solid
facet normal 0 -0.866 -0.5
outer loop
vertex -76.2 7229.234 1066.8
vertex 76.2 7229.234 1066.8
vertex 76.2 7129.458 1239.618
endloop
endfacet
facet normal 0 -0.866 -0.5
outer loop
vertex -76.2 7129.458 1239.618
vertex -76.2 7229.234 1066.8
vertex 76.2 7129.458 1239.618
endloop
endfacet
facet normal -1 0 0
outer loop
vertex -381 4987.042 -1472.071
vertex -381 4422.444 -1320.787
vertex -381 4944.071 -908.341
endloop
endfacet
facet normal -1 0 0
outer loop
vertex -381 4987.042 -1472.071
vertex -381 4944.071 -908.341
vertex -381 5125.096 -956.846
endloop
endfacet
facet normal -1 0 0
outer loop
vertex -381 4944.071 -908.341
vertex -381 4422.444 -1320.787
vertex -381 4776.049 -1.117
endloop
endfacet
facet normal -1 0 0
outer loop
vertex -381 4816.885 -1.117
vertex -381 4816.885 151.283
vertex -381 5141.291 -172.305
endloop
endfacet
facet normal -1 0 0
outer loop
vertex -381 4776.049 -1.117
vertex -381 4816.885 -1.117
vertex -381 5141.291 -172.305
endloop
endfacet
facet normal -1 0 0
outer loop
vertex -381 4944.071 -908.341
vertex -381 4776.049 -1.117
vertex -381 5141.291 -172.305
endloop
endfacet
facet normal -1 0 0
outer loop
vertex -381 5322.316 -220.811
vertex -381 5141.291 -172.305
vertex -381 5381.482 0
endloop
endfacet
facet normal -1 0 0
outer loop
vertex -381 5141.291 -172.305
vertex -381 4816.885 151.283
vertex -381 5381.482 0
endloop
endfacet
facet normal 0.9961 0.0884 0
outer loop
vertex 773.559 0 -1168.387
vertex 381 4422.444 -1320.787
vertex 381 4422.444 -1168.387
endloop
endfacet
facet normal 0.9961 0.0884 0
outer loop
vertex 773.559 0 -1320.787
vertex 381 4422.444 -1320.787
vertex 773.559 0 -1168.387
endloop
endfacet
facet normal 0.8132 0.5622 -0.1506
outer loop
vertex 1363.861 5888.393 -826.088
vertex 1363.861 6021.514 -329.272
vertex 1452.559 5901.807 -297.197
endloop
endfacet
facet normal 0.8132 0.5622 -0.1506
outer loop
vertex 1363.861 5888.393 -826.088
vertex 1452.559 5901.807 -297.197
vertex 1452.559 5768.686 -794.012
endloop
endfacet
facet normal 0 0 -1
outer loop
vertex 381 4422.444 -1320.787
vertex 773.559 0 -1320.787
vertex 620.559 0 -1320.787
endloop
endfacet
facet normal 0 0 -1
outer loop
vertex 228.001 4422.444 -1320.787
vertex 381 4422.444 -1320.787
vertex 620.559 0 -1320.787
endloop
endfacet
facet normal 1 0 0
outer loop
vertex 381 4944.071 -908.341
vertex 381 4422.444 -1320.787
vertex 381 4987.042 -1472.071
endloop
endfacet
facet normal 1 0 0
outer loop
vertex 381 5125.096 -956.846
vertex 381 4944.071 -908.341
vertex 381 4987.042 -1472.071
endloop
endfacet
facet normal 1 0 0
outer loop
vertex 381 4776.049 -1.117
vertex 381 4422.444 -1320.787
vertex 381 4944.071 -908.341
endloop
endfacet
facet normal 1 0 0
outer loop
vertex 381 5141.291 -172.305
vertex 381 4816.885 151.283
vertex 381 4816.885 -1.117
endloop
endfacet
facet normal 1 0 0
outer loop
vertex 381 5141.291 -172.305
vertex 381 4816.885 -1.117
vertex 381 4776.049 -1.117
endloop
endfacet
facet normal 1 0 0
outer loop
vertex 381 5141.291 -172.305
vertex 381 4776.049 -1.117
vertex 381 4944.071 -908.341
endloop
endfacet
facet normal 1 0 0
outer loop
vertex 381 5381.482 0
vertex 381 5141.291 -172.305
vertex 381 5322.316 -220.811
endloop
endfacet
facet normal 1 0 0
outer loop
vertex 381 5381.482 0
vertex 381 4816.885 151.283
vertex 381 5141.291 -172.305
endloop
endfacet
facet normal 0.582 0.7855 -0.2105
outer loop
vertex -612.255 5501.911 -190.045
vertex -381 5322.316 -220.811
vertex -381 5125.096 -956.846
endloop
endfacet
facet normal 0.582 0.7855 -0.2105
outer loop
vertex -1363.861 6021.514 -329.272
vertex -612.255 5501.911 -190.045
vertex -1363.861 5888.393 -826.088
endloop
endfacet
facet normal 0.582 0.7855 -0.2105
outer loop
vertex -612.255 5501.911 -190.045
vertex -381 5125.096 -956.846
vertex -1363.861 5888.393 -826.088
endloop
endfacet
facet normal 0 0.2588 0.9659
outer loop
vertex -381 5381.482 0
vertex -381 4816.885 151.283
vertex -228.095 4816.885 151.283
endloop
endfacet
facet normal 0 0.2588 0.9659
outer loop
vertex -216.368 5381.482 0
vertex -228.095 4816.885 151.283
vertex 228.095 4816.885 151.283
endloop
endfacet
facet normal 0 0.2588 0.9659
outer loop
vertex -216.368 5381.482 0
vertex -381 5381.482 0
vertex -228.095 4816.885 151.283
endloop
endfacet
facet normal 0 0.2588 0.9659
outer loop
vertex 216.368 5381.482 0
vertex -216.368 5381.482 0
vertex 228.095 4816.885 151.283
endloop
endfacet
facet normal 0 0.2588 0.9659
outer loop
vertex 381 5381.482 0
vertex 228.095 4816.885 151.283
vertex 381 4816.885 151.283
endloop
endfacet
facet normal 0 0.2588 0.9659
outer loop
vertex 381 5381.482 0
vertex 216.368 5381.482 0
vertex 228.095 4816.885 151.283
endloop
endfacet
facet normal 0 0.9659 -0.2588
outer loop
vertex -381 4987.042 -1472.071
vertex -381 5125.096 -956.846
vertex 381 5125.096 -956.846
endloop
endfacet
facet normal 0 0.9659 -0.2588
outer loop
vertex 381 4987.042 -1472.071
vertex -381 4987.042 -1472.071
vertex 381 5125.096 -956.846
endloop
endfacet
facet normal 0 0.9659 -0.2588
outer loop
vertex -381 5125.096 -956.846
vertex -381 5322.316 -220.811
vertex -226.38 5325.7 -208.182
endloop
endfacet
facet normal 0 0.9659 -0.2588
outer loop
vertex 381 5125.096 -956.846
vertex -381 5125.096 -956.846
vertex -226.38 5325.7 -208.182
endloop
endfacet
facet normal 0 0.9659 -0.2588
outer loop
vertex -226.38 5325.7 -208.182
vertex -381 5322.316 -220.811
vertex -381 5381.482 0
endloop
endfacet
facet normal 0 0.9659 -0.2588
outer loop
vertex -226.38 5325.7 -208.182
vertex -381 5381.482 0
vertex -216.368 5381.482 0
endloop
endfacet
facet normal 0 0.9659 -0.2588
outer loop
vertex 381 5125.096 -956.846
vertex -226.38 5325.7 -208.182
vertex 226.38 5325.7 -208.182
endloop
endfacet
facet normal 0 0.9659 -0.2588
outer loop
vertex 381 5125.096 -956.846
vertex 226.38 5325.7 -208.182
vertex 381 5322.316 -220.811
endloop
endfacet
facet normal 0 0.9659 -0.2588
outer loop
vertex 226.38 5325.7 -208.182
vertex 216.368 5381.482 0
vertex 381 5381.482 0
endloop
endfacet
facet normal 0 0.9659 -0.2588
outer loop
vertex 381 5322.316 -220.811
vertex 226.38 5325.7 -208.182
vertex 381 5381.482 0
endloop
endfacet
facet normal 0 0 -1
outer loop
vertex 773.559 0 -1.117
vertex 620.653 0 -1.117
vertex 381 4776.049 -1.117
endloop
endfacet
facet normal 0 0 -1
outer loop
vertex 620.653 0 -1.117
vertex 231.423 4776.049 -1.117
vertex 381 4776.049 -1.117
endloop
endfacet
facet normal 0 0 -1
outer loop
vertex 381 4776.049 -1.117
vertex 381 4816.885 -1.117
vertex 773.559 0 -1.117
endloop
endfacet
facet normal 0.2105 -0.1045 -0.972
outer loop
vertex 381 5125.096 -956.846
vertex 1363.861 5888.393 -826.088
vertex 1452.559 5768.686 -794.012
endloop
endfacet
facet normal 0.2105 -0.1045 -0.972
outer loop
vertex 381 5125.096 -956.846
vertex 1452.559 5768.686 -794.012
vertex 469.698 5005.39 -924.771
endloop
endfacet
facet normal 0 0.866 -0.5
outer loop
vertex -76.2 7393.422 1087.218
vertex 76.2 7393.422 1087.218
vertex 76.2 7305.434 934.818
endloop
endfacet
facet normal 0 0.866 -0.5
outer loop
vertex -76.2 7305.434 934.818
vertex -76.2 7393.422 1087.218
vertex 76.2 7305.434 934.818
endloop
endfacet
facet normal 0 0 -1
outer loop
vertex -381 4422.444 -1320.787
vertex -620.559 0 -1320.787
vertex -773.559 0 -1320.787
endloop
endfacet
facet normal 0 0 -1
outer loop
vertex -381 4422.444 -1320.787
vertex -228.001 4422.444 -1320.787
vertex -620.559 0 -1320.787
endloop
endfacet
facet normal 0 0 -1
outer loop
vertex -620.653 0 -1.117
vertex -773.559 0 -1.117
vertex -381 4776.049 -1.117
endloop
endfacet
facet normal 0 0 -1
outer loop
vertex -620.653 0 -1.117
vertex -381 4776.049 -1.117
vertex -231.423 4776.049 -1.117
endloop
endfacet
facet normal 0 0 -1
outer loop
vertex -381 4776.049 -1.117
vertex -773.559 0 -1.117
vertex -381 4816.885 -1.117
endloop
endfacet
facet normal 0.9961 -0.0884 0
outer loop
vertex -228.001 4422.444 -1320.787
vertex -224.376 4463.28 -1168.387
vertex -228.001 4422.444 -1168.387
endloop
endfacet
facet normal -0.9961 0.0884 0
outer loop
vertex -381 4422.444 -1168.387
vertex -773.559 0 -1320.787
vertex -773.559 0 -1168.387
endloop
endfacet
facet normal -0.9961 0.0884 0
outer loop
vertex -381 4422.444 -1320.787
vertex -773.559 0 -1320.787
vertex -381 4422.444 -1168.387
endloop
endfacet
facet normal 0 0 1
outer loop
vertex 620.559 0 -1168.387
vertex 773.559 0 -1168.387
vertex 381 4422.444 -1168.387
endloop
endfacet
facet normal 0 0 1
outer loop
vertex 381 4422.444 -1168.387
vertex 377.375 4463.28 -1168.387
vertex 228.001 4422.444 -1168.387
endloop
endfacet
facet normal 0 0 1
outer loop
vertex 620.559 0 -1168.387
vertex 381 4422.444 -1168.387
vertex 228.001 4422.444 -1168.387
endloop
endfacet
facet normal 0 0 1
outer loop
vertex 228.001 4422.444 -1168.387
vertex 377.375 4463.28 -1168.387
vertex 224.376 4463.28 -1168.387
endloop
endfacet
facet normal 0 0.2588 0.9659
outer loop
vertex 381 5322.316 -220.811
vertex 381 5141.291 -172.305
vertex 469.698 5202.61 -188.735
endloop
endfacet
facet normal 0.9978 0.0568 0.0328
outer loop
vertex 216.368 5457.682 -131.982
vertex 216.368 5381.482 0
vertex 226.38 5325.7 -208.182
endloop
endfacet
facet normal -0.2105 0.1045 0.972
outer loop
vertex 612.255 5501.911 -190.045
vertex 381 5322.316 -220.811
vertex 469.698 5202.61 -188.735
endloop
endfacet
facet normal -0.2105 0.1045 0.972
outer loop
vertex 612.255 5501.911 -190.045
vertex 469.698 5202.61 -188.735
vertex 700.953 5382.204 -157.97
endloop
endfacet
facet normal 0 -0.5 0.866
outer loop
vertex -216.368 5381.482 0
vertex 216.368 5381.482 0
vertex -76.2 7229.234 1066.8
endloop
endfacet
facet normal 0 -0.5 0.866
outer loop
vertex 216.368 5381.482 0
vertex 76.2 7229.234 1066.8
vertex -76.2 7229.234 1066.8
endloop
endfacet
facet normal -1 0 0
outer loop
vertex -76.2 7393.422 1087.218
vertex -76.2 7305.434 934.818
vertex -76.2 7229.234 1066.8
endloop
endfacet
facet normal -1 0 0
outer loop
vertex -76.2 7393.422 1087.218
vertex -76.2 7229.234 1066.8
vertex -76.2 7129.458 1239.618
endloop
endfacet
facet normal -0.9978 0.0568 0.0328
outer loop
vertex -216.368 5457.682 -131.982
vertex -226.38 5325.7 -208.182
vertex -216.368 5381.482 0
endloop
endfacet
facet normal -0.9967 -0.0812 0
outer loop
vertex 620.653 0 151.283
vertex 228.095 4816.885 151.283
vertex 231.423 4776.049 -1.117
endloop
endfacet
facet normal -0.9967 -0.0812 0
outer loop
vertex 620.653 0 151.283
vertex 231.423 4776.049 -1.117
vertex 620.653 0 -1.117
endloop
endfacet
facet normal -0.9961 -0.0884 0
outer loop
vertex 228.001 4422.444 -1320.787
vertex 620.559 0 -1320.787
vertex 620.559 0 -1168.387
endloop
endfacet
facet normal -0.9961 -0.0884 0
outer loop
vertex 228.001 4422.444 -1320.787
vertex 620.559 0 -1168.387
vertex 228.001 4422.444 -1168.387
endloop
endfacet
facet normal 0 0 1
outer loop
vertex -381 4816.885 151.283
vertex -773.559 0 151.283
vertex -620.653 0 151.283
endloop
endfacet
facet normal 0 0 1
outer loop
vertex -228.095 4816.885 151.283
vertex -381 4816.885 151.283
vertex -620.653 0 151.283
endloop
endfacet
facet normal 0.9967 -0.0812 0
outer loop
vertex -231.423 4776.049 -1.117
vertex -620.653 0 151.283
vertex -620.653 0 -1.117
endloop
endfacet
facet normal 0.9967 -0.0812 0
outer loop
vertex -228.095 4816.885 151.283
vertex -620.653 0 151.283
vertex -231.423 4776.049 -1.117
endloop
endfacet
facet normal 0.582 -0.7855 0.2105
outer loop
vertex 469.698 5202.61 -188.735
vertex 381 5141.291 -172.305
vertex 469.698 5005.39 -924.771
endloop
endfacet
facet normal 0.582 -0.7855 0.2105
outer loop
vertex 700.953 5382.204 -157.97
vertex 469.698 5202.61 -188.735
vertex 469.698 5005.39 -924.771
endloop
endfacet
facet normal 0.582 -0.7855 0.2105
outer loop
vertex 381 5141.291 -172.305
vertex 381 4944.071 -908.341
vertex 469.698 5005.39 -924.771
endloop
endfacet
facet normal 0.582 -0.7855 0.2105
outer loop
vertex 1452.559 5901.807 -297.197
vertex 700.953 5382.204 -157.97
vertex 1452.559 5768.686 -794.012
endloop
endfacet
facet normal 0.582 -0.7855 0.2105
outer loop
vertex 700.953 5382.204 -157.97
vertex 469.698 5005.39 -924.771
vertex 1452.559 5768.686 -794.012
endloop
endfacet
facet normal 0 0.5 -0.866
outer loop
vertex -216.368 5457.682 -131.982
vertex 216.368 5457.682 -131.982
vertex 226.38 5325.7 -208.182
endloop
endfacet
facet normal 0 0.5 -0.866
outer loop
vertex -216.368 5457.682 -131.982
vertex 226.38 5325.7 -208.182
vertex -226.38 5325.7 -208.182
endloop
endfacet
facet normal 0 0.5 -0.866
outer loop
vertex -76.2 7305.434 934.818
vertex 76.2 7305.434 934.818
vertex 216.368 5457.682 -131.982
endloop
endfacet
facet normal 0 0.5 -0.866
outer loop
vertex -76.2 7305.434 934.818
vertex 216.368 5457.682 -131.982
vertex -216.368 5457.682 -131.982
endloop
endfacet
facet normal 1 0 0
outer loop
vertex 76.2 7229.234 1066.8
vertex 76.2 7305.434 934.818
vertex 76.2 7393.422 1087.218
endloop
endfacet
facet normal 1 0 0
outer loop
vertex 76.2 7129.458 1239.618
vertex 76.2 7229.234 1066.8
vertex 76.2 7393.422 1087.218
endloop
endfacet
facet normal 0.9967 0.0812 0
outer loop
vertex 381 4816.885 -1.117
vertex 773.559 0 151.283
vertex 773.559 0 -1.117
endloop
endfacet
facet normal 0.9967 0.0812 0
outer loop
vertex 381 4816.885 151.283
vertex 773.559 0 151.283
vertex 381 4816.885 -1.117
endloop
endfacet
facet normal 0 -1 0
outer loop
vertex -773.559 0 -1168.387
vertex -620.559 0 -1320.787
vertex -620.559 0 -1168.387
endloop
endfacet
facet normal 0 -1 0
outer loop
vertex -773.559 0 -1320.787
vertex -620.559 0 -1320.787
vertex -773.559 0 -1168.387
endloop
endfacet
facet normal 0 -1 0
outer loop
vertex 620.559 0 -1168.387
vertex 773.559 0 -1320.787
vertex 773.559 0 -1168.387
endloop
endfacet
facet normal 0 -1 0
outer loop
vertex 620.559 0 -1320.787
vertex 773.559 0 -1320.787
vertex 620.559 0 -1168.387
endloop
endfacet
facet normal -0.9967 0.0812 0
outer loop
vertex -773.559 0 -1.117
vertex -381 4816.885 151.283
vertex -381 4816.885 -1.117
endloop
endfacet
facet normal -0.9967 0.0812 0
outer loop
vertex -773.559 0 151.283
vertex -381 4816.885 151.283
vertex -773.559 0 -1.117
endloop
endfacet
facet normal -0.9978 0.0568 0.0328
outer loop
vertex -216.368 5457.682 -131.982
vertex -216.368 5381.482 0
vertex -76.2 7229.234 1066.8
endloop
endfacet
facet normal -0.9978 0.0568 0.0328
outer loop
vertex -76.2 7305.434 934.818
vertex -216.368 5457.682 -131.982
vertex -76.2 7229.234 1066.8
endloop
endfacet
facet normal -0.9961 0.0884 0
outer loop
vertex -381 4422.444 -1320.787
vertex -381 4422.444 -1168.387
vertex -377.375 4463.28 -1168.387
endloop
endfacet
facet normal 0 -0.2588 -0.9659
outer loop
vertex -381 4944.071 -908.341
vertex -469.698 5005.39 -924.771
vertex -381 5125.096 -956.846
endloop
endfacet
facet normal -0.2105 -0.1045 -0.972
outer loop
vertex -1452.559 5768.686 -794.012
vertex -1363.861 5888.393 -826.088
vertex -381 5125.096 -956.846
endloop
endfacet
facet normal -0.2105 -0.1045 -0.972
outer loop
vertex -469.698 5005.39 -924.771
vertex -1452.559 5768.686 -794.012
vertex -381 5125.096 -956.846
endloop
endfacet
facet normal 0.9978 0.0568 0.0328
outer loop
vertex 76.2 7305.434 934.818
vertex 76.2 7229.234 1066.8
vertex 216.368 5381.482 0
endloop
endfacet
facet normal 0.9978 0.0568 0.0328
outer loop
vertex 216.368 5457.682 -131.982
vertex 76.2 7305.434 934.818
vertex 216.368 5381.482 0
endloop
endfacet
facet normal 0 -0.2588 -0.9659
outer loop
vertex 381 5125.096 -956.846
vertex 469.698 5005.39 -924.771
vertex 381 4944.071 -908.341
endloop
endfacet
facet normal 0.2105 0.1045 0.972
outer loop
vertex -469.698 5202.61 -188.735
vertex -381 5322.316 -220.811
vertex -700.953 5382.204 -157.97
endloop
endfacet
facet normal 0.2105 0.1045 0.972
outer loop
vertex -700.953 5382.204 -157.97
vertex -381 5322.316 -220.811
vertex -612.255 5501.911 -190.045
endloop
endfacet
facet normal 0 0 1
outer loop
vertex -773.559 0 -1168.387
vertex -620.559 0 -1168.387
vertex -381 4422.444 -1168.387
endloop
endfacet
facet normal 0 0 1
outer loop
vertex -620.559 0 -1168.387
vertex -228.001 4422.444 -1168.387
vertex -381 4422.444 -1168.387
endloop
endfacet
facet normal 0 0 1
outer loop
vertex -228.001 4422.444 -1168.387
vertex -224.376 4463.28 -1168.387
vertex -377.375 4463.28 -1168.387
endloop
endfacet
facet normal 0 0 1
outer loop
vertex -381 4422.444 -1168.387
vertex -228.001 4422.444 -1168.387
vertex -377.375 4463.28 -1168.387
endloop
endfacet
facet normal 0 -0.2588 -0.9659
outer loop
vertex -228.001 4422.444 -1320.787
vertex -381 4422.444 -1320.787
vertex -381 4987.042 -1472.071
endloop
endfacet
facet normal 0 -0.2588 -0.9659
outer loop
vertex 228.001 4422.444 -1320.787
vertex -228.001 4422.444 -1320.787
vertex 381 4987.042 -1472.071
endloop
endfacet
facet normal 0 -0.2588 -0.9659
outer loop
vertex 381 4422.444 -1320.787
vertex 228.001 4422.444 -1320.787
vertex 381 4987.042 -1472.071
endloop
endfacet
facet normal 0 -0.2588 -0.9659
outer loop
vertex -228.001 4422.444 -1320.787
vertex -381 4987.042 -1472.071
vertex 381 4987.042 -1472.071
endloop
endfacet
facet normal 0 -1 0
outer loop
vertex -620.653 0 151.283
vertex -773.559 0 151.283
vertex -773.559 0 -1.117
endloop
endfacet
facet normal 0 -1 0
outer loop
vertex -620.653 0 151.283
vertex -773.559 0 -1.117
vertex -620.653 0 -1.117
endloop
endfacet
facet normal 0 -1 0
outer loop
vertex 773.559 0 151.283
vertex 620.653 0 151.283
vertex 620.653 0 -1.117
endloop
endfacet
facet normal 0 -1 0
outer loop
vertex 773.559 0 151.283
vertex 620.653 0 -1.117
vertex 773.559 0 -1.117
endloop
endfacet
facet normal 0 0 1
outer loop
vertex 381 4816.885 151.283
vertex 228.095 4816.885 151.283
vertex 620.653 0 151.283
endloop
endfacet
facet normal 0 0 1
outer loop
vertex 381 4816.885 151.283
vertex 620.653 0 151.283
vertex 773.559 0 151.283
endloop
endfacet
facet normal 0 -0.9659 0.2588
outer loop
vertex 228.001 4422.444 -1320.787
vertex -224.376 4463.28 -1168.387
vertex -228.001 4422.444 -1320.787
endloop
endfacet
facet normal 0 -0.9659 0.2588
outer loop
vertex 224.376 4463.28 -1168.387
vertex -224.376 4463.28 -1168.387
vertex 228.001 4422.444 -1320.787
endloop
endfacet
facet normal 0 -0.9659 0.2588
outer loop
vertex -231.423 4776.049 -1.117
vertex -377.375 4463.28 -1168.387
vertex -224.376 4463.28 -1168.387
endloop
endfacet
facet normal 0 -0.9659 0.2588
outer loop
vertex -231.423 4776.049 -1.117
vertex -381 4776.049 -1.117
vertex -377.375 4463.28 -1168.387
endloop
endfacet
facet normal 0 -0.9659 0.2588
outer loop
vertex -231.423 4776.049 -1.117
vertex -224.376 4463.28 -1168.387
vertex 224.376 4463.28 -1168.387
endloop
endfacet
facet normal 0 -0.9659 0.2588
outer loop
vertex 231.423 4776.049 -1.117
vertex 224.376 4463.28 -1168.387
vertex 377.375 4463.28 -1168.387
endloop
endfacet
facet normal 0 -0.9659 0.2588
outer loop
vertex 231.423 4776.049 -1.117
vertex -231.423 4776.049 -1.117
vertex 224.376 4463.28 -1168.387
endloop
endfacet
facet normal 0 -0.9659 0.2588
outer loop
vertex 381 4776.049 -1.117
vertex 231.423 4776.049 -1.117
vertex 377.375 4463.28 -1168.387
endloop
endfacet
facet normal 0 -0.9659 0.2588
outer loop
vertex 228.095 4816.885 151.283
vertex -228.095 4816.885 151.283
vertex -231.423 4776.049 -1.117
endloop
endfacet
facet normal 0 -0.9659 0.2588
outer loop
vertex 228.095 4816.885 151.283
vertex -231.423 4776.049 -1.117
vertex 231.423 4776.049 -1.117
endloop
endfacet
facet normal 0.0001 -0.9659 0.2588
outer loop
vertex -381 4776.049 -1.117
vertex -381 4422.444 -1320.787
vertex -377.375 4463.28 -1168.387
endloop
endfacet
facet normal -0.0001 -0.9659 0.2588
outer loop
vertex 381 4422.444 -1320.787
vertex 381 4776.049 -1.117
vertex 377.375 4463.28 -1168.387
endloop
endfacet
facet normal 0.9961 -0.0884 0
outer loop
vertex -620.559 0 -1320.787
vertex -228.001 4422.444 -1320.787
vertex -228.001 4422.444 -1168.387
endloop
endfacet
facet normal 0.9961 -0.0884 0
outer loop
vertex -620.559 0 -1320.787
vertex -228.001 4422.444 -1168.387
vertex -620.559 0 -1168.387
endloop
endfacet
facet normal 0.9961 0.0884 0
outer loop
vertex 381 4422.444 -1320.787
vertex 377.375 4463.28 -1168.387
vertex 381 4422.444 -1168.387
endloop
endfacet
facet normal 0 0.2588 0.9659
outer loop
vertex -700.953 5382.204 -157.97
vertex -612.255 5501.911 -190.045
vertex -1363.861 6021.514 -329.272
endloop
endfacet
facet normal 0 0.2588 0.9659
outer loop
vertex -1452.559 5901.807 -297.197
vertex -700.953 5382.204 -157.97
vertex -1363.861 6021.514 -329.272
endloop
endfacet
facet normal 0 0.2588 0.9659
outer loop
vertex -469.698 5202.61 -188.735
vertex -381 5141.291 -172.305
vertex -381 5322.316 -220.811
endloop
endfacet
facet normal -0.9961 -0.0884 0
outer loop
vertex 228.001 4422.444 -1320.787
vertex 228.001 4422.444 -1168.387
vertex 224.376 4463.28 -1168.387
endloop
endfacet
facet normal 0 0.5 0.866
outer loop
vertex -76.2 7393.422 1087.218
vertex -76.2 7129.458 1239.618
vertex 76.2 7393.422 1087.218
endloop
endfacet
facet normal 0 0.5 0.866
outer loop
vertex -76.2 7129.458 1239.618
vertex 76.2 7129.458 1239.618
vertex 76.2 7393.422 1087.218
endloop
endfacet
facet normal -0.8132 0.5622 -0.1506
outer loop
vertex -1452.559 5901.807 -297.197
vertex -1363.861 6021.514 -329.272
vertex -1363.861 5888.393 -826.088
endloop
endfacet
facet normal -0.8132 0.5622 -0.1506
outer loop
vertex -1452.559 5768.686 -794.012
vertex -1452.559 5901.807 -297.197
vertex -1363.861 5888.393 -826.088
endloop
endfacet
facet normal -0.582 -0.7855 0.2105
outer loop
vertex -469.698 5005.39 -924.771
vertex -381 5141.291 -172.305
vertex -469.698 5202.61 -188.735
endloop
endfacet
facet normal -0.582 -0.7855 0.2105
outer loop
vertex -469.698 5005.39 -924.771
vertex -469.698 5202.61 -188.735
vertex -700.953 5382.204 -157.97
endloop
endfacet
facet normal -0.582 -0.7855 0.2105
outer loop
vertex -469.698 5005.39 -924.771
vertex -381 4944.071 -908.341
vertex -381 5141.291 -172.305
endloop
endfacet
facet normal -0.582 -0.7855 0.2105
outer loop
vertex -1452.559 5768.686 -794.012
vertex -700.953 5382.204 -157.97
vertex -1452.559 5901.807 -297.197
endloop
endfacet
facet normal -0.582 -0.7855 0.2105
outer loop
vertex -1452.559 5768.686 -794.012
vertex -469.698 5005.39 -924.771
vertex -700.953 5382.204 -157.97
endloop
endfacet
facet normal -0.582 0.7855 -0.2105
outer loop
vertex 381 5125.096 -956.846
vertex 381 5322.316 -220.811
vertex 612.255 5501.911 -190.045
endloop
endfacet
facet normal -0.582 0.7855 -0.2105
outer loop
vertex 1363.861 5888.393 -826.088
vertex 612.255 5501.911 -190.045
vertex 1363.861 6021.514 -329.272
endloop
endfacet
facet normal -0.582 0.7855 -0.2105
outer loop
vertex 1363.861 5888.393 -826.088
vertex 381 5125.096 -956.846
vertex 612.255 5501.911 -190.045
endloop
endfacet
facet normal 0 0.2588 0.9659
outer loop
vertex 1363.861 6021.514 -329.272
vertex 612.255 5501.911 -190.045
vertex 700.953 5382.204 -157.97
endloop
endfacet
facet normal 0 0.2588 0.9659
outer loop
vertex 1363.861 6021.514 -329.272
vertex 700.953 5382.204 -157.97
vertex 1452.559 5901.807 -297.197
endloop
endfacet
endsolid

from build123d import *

# Parameters (mm, degrees)
SKETCH9_W            = 762
SKETCH9_H            = 584.514480793
BOSS_EXTRUDE6_DEPTH  = 1524
BOSS_EXTRUDE7_DEPTH  = 152.4
BOSS_EXTRUDE8_DEPTH  = 152.4
BOSS_EXTRUDE11_DEPTH = 76.2
BOSS_EXTRUDE9_DEPTH  = 152.4
BOSS_EXTRUDE10_DEPTH = 152.4


with BuildPart() as part:
    # Sketch9 → Boss-Extrude6 (new body)
    with BuildSketch(Plane(origin=(0, 360.490957412, 1345.370568731), x_dir=(1, 0, 0), z_dir=(0, 0.25881904510252135, 0.9659258262890681))):
        with Locations((0, 4905.855472671)):
            Rectangle(SKETCH9_W, SKETCH9_H)
    extrude(amount=-BOSS_EXTRUDE6_DEPTH)

    # Sketch3 → Boss-Extrude7 (add)
    with BuildSketch(Plane(origin=(-2331.096675302, 3146.053127226, -842.982394786), x_dir=(0.8131847216037706, 0.5621743148677428, -0.15063415367433172), z_dir=(-0.5820056774209321, 0.785476124140768, -0.2104676931374475))):
        Polygon((3335.15448981, -1164.230103632), (3619.536761347, -1240.430103632), (4543.811009791, -1240.430103632), (4543.811009791, -726.088642088), (3335.15448981, -402.230103632), (3182.75448981, -402.230103632), (3182.75448981, -1164.230103632), align=None)
    boss_extrude7 = extrude(amount=-BOSS_EXTRUDE7_DEPTH)

    # Mirror1: Boss-Extrude7 across plane
    add(boss_extrude7.mirror(Plane(origin=(0, 0, 0), x_dir=(0, 0, 1), z_dir=(1, 0, 0))))

    # Sketch4 → Boss-Extrude8 (add)
    with BuildSketch(Plane(origin=(0, 1345.370568731, -2330.250180051), x_dir=(1, 0, 0), z_dir=(0, -0.500000000000001, 0.866025403784438))):
        Polygon((-216.36773556, 4660.500360101), (-76.2, 6794.100360101), (76.2, 6794.100360101), (216.36773556, 4660.500360101), (226.379716672, 4508.100360101), (-226.379716672, 4508.100360101), align=None)
    extrude(amount=-BOSS_EXTRUDE8_DEPTH)

    # Sketch13 → Boss-Extrude11 (add, symmetric)
    with BuildSketch(Plane(origin=(0, 0, 0), x_dir=(0, 0, -1), z_dir=(1, 0, 0))):
        Polygon((-934.817728463, 7305.43407644), (-1239.617728463, 7129.457714391), (-1087.217728463, 7393.422257464), align=None)
    extrude(amount=BOSS_EXTRUDE11_DEPTH, both=True)

    # Sketch10 → Boss-Extrude9 (add)
    with BuildSketch(Plane.XY.offset(151.283479767)):
        Polygon((-381, 4816.884642088), (-773.558553377, 0), (-620.653296714, 0), (-228.094743337, 4816.884642088), align=None)
        Polygon((773.558553377, 0), (381, 4816.884642088), (228.094743337, 4816.884642088), (620.653296714, 0), align=None)
    extrude(amount=-BOSS_EXTRUDE9_DEPTH)

    # Sketch12 → Boss-Extrude10 (add)
    with BuildSketch(Plane.XY.offset(-1320.787479497)):
        Polygon((381, 4422.444417351), (773.558553377, 0), (620.559333608, 0), (228.00078023, 4422.444417351), (214.472984765, 4574.844417351), (367.472204535, 4574.844417351), align=None)
        Polygon((-773.558553377, 0), (-381, 4422.444417351), (-367.472204535, 4574.844417351), (-214.472984765, 4574.844417351), (-228.00078023, 4422.444417351), (-620.559333608, 0), align=None)
    extrude(amount=BOSS_EXTRUDE10_DEPTH)


solid = part.part
